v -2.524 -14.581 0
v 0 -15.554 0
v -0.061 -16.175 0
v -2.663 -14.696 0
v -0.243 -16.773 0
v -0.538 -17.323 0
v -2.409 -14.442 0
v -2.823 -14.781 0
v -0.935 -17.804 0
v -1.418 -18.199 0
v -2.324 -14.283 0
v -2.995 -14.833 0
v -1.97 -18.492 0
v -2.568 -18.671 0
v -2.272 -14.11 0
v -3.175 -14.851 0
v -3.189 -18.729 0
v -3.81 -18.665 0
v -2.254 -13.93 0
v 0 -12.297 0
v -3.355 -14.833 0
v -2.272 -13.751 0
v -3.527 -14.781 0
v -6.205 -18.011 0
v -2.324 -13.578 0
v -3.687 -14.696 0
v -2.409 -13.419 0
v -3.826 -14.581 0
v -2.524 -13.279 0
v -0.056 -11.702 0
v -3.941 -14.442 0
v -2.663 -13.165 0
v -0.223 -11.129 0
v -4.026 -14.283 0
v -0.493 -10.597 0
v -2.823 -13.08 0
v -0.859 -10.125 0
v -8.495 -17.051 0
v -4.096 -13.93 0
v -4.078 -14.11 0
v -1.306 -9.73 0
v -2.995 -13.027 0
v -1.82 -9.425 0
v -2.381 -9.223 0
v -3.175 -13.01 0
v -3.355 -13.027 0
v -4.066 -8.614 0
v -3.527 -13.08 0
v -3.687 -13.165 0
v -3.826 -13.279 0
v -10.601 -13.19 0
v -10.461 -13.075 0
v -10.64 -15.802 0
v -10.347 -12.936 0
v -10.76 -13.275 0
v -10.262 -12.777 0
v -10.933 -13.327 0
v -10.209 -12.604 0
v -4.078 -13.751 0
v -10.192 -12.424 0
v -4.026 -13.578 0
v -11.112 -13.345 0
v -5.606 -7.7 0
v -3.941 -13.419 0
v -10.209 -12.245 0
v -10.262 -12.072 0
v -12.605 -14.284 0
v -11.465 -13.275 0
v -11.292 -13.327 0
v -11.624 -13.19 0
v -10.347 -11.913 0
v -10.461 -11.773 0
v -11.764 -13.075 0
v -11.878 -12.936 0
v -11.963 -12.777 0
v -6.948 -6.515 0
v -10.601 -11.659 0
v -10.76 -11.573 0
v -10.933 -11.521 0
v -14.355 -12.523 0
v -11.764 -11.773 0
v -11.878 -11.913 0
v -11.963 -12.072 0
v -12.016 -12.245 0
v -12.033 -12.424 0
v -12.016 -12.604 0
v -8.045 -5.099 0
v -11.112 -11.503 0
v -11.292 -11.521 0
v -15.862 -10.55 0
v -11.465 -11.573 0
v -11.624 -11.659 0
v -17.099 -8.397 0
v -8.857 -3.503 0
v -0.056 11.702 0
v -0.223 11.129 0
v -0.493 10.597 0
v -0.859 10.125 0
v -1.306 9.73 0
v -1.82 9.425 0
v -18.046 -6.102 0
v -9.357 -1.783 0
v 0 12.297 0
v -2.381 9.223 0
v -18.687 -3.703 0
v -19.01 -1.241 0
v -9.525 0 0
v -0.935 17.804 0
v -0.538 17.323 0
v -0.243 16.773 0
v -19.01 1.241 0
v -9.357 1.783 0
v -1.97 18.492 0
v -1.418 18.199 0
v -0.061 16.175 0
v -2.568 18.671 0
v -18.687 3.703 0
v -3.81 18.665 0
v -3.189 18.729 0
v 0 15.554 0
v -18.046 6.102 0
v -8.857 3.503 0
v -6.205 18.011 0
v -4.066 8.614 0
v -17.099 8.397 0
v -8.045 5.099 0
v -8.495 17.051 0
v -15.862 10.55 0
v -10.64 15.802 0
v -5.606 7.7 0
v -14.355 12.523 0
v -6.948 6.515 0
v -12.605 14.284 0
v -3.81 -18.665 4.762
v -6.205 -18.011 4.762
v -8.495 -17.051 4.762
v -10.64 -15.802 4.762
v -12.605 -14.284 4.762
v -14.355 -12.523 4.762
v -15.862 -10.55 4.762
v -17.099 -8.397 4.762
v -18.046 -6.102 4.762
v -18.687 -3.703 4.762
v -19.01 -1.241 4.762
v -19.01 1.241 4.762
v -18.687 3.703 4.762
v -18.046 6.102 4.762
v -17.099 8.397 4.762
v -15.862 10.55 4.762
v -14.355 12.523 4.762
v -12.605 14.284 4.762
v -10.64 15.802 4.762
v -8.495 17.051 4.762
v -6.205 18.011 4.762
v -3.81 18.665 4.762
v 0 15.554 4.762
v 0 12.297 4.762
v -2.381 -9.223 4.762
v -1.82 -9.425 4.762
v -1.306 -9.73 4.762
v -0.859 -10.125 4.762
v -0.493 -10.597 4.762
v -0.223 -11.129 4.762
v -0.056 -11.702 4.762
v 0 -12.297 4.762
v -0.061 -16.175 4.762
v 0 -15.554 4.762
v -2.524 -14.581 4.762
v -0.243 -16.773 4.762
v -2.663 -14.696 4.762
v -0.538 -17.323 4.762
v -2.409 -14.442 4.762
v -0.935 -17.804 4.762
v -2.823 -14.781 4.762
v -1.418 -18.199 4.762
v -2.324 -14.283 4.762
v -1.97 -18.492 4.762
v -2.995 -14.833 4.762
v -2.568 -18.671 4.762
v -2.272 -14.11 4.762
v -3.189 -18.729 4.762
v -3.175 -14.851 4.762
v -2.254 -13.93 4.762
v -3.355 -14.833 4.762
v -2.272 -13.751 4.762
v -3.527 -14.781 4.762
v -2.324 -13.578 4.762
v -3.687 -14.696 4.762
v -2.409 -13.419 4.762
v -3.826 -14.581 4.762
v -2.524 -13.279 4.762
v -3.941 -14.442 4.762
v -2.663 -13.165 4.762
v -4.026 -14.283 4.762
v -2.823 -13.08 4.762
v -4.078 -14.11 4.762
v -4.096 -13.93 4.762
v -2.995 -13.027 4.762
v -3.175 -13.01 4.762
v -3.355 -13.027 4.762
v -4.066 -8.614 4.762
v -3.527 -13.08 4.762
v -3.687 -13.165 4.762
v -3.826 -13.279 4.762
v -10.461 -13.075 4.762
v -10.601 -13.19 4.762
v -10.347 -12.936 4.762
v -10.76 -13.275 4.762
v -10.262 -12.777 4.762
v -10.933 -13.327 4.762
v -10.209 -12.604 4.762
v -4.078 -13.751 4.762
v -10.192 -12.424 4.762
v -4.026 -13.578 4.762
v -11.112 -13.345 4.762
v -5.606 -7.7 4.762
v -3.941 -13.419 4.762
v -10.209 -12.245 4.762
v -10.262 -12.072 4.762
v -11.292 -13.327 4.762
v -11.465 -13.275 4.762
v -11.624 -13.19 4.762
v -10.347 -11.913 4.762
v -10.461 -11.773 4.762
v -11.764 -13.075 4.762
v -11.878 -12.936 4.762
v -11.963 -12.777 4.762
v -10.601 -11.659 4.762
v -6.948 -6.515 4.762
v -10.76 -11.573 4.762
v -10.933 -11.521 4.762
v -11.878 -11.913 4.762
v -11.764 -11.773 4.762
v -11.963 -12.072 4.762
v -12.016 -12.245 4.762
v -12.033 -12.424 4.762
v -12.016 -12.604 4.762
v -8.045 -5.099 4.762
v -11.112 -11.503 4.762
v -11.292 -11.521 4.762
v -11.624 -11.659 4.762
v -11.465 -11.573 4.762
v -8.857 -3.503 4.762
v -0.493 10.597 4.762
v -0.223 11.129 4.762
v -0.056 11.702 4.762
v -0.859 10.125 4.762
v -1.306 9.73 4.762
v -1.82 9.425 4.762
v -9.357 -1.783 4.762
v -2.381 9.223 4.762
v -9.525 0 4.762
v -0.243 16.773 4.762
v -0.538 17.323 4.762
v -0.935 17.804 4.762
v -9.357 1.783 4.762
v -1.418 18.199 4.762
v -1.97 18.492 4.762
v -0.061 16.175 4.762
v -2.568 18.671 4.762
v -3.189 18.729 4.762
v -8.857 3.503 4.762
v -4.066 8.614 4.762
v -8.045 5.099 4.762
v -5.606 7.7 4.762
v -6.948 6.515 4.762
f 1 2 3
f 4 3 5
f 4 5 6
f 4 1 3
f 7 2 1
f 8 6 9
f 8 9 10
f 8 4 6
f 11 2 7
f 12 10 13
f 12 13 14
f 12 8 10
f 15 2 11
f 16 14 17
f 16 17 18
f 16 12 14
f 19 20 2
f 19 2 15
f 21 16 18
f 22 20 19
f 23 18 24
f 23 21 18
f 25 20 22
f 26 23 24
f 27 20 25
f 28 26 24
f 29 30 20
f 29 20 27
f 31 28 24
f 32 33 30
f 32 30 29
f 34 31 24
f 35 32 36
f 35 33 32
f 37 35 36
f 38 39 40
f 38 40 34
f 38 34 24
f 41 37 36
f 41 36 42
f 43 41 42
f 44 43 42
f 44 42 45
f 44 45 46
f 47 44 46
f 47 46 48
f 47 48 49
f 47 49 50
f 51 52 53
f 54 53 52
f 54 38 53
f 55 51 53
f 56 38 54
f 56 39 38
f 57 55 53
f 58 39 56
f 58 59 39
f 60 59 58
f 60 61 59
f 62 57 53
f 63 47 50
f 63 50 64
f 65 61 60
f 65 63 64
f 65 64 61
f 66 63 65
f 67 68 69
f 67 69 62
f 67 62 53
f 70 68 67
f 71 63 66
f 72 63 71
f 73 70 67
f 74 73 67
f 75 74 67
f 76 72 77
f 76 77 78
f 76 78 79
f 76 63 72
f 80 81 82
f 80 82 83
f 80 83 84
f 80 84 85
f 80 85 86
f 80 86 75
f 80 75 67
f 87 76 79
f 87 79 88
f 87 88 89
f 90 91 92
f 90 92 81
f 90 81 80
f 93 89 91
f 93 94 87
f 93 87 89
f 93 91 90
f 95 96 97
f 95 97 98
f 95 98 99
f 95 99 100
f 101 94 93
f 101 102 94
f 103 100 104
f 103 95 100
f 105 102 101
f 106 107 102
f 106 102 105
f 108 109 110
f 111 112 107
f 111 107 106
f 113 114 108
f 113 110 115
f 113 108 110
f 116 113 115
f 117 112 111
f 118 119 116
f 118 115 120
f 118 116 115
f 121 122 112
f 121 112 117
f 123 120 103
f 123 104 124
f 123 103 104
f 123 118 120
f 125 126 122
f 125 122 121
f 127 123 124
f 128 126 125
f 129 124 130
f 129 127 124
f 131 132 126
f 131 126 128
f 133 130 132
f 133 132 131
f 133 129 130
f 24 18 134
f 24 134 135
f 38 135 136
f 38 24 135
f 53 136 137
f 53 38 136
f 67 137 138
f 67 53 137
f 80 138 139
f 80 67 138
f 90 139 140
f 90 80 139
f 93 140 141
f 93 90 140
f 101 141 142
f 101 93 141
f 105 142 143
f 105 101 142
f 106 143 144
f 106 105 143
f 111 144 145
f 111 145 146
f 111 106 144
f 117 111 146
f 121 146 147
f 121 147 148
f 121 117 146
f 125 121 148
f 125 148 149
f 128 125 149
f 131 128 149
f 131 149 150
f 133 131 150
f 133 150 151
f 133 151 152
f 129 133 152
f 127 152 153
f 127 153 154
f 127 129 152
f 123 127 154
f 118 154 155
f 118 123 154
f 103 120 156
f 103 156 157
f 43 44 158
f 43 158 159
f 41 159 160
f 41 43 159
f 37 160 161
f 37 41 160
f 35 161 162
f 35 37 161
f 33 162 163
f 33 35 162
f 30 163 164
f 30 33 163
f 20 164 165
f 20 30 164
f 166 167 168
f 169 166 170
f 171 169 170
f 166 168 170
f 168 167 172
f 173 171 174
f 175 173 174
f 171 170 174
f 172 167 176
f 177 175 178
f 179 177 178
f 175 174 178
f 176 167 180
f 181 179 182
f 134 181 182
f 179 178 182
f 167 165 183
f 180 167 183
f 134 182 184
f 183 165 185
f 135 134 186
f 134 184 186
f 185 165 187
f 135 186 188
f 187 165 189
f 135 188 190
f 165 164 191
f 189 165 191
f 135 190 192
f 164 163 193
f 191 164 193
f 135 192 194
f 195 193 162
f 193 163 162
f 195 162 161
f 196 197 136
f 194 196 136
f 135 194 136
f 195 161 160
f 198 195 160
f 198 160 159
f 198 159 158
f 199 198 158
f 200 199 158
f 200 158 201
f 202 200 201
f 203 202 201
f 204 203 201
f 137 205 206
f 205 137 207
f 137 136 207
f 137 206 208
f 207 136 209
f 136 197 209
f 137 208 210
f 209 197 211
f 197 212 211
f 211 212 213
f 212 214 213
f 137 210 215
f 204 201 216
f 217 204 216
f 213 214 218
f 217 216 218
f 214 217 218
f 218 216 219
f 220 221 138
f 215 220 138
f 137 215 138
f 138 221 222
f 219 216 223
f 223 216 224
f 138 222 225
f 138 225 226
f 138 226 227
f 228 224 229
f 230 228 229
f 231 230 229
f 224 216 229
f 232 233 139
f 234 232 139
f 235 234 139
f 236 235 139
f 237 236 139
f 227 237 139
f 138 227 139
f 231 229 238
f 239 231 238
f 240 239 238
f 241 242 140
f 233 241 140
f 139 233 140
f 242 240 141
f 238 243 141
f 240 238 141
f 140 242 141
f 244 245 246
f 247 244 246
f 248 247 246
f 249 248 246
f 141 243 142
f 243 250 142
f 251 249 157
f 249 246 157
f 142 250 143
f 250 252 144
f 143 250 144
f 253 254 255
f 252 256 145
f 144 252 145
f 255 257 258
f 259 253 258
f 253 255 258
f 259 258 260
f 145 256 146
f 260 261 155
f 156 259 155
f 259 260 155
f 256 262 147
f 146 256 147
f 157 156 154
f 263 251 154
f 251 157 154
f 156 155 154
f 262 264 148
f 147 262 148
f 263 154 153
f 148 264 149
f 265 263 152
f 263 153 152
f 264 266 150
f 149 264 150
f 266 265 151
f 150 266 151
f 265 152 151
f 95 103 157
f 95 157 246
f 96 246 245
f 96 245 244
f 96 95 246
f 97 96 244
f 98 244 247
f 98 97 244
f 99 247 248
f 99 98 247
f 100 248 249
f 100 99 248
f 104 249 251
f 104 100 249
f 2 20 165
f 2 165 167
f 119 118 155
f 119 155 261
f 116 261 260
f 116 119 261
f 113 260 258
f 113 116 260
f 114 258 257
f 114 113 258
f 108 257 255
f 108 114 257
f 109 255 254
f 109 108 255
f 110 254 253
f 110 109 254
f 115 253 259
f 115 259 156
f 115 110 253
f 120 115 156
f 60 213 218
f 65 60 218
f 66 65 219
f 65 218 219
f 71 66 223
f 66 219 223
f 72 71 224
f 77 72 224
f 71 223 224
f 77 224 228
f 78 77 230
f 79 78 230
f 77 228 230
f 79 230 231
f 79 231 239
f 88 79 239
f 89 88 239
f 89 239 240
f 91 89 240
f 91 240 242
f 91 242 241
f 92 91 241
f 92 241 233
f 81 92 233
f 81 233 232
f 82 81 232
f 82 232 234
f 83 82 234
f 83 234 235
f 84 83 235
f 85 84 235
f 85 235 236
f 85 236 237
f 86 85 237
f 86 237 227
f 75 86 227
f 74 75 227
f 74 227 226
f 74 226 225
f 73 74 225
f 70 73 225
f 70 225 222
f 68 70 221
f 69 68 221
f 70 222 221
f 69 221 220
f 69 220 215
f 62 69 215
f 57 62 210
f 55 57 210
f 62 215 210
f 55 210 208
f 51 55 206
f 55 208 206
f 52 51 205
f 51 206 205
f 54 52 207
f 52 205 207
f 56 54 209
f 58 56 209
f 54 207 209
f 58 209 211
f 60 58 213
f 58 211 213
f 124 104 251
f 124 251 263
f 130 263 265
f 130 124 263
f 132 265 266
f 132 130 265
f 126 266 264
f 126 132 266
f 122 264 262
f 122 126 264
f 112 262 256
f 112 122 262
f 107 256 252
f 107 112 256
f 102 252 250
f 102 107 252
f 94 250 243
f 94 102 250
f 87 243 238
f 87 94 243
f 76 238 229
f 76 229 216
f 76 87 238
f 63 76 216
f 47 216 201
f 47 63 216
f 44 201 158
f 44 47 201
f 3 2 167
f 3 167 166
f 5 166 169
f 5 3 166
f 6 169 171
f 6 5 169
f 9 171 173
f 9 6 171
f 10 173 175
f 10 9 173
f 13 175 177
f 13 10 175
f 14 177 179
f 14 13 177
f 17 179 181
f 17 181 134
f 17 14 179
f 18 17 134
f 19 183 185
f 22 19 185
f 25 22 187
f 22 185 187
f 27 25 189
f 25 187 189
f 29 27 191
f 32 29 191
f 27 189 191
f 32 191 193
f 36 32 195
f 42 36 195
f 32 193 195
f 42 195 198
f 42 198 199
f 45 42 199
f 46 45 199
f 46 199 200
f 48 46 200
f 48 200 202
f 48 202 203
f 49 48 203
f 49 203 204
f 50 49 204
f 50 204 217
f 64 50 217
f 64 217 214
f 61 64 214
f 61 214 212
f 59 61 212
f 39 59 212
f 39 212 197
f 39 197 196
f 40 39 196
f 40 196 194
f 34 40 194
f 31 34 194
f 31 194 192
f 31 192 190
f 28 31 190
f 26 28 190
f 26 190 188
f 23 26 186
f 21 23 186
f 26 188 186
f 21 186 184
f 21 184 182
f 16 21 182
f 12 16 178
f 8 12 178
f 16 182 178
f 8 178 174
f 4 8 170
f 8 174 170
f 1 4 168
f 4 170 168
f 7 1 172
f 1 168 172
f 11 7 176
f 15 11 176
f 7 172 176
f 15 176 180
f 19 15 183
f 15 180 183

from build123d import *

# Parameters (mm, degrees)
FINGER_BODY_DEPTH      = 4.7625
SKETCH5_R              = 0.92075
FINGER_PIN_HOLES_DEPTH = 28.13612134


with BuildPart() as part:
    # Finger Drawing → Finger Body (new body)
    with BuildSketch(Plane.XY):
        with BuildLine():
            Line((0, 15.554259867), (0, 12.296722124))
            ThreePointArc((0, 12.296722124), (-0.664942107, 10.352439641), (-2.38125, 9.222541593))
            ThreePointArc((-2.38125, 9.222541593), (-9.525, 0), (-2.38125, -9.222541593))
            ThreePointArc((-2.38125, -9.222541593), (-0.664942107, -10.352439641), (0, -12.296722124))
            Line((0, -12.296722124), (0, -15.554259867))
            ThreePointArc((0, -15.554259867), (-1.166953686, -18.013604292), (-3.81, -18.66511184))
            ThreePointArc((-3.81, -18.66511184), (-19.05, 0), (-3.81, 18.66511184))
            ThreePointArc((-3.81, 18.66511184), (-1.166953686, 18.013604292), (0, 15.554259867))
        make_face()
    extrude(amount=FINGER_BODY_DEPTH)

    # Sketch5 → Finger Pin Holes (cut, through all)
    with BuildSketch(Plane.XY.offset(4.7625)):
        with Locations((-3.175, -13.930255965)):
            Circle(SKETCH5_R)
        with Locations((-11.1125, -12.4241527)):
            Circle(SKETCH5_R)
    extrude(amount=-FINGER_PIN_HOLES_DEPTH, mode=Mode.SUBTRACT)


solid = part.part
